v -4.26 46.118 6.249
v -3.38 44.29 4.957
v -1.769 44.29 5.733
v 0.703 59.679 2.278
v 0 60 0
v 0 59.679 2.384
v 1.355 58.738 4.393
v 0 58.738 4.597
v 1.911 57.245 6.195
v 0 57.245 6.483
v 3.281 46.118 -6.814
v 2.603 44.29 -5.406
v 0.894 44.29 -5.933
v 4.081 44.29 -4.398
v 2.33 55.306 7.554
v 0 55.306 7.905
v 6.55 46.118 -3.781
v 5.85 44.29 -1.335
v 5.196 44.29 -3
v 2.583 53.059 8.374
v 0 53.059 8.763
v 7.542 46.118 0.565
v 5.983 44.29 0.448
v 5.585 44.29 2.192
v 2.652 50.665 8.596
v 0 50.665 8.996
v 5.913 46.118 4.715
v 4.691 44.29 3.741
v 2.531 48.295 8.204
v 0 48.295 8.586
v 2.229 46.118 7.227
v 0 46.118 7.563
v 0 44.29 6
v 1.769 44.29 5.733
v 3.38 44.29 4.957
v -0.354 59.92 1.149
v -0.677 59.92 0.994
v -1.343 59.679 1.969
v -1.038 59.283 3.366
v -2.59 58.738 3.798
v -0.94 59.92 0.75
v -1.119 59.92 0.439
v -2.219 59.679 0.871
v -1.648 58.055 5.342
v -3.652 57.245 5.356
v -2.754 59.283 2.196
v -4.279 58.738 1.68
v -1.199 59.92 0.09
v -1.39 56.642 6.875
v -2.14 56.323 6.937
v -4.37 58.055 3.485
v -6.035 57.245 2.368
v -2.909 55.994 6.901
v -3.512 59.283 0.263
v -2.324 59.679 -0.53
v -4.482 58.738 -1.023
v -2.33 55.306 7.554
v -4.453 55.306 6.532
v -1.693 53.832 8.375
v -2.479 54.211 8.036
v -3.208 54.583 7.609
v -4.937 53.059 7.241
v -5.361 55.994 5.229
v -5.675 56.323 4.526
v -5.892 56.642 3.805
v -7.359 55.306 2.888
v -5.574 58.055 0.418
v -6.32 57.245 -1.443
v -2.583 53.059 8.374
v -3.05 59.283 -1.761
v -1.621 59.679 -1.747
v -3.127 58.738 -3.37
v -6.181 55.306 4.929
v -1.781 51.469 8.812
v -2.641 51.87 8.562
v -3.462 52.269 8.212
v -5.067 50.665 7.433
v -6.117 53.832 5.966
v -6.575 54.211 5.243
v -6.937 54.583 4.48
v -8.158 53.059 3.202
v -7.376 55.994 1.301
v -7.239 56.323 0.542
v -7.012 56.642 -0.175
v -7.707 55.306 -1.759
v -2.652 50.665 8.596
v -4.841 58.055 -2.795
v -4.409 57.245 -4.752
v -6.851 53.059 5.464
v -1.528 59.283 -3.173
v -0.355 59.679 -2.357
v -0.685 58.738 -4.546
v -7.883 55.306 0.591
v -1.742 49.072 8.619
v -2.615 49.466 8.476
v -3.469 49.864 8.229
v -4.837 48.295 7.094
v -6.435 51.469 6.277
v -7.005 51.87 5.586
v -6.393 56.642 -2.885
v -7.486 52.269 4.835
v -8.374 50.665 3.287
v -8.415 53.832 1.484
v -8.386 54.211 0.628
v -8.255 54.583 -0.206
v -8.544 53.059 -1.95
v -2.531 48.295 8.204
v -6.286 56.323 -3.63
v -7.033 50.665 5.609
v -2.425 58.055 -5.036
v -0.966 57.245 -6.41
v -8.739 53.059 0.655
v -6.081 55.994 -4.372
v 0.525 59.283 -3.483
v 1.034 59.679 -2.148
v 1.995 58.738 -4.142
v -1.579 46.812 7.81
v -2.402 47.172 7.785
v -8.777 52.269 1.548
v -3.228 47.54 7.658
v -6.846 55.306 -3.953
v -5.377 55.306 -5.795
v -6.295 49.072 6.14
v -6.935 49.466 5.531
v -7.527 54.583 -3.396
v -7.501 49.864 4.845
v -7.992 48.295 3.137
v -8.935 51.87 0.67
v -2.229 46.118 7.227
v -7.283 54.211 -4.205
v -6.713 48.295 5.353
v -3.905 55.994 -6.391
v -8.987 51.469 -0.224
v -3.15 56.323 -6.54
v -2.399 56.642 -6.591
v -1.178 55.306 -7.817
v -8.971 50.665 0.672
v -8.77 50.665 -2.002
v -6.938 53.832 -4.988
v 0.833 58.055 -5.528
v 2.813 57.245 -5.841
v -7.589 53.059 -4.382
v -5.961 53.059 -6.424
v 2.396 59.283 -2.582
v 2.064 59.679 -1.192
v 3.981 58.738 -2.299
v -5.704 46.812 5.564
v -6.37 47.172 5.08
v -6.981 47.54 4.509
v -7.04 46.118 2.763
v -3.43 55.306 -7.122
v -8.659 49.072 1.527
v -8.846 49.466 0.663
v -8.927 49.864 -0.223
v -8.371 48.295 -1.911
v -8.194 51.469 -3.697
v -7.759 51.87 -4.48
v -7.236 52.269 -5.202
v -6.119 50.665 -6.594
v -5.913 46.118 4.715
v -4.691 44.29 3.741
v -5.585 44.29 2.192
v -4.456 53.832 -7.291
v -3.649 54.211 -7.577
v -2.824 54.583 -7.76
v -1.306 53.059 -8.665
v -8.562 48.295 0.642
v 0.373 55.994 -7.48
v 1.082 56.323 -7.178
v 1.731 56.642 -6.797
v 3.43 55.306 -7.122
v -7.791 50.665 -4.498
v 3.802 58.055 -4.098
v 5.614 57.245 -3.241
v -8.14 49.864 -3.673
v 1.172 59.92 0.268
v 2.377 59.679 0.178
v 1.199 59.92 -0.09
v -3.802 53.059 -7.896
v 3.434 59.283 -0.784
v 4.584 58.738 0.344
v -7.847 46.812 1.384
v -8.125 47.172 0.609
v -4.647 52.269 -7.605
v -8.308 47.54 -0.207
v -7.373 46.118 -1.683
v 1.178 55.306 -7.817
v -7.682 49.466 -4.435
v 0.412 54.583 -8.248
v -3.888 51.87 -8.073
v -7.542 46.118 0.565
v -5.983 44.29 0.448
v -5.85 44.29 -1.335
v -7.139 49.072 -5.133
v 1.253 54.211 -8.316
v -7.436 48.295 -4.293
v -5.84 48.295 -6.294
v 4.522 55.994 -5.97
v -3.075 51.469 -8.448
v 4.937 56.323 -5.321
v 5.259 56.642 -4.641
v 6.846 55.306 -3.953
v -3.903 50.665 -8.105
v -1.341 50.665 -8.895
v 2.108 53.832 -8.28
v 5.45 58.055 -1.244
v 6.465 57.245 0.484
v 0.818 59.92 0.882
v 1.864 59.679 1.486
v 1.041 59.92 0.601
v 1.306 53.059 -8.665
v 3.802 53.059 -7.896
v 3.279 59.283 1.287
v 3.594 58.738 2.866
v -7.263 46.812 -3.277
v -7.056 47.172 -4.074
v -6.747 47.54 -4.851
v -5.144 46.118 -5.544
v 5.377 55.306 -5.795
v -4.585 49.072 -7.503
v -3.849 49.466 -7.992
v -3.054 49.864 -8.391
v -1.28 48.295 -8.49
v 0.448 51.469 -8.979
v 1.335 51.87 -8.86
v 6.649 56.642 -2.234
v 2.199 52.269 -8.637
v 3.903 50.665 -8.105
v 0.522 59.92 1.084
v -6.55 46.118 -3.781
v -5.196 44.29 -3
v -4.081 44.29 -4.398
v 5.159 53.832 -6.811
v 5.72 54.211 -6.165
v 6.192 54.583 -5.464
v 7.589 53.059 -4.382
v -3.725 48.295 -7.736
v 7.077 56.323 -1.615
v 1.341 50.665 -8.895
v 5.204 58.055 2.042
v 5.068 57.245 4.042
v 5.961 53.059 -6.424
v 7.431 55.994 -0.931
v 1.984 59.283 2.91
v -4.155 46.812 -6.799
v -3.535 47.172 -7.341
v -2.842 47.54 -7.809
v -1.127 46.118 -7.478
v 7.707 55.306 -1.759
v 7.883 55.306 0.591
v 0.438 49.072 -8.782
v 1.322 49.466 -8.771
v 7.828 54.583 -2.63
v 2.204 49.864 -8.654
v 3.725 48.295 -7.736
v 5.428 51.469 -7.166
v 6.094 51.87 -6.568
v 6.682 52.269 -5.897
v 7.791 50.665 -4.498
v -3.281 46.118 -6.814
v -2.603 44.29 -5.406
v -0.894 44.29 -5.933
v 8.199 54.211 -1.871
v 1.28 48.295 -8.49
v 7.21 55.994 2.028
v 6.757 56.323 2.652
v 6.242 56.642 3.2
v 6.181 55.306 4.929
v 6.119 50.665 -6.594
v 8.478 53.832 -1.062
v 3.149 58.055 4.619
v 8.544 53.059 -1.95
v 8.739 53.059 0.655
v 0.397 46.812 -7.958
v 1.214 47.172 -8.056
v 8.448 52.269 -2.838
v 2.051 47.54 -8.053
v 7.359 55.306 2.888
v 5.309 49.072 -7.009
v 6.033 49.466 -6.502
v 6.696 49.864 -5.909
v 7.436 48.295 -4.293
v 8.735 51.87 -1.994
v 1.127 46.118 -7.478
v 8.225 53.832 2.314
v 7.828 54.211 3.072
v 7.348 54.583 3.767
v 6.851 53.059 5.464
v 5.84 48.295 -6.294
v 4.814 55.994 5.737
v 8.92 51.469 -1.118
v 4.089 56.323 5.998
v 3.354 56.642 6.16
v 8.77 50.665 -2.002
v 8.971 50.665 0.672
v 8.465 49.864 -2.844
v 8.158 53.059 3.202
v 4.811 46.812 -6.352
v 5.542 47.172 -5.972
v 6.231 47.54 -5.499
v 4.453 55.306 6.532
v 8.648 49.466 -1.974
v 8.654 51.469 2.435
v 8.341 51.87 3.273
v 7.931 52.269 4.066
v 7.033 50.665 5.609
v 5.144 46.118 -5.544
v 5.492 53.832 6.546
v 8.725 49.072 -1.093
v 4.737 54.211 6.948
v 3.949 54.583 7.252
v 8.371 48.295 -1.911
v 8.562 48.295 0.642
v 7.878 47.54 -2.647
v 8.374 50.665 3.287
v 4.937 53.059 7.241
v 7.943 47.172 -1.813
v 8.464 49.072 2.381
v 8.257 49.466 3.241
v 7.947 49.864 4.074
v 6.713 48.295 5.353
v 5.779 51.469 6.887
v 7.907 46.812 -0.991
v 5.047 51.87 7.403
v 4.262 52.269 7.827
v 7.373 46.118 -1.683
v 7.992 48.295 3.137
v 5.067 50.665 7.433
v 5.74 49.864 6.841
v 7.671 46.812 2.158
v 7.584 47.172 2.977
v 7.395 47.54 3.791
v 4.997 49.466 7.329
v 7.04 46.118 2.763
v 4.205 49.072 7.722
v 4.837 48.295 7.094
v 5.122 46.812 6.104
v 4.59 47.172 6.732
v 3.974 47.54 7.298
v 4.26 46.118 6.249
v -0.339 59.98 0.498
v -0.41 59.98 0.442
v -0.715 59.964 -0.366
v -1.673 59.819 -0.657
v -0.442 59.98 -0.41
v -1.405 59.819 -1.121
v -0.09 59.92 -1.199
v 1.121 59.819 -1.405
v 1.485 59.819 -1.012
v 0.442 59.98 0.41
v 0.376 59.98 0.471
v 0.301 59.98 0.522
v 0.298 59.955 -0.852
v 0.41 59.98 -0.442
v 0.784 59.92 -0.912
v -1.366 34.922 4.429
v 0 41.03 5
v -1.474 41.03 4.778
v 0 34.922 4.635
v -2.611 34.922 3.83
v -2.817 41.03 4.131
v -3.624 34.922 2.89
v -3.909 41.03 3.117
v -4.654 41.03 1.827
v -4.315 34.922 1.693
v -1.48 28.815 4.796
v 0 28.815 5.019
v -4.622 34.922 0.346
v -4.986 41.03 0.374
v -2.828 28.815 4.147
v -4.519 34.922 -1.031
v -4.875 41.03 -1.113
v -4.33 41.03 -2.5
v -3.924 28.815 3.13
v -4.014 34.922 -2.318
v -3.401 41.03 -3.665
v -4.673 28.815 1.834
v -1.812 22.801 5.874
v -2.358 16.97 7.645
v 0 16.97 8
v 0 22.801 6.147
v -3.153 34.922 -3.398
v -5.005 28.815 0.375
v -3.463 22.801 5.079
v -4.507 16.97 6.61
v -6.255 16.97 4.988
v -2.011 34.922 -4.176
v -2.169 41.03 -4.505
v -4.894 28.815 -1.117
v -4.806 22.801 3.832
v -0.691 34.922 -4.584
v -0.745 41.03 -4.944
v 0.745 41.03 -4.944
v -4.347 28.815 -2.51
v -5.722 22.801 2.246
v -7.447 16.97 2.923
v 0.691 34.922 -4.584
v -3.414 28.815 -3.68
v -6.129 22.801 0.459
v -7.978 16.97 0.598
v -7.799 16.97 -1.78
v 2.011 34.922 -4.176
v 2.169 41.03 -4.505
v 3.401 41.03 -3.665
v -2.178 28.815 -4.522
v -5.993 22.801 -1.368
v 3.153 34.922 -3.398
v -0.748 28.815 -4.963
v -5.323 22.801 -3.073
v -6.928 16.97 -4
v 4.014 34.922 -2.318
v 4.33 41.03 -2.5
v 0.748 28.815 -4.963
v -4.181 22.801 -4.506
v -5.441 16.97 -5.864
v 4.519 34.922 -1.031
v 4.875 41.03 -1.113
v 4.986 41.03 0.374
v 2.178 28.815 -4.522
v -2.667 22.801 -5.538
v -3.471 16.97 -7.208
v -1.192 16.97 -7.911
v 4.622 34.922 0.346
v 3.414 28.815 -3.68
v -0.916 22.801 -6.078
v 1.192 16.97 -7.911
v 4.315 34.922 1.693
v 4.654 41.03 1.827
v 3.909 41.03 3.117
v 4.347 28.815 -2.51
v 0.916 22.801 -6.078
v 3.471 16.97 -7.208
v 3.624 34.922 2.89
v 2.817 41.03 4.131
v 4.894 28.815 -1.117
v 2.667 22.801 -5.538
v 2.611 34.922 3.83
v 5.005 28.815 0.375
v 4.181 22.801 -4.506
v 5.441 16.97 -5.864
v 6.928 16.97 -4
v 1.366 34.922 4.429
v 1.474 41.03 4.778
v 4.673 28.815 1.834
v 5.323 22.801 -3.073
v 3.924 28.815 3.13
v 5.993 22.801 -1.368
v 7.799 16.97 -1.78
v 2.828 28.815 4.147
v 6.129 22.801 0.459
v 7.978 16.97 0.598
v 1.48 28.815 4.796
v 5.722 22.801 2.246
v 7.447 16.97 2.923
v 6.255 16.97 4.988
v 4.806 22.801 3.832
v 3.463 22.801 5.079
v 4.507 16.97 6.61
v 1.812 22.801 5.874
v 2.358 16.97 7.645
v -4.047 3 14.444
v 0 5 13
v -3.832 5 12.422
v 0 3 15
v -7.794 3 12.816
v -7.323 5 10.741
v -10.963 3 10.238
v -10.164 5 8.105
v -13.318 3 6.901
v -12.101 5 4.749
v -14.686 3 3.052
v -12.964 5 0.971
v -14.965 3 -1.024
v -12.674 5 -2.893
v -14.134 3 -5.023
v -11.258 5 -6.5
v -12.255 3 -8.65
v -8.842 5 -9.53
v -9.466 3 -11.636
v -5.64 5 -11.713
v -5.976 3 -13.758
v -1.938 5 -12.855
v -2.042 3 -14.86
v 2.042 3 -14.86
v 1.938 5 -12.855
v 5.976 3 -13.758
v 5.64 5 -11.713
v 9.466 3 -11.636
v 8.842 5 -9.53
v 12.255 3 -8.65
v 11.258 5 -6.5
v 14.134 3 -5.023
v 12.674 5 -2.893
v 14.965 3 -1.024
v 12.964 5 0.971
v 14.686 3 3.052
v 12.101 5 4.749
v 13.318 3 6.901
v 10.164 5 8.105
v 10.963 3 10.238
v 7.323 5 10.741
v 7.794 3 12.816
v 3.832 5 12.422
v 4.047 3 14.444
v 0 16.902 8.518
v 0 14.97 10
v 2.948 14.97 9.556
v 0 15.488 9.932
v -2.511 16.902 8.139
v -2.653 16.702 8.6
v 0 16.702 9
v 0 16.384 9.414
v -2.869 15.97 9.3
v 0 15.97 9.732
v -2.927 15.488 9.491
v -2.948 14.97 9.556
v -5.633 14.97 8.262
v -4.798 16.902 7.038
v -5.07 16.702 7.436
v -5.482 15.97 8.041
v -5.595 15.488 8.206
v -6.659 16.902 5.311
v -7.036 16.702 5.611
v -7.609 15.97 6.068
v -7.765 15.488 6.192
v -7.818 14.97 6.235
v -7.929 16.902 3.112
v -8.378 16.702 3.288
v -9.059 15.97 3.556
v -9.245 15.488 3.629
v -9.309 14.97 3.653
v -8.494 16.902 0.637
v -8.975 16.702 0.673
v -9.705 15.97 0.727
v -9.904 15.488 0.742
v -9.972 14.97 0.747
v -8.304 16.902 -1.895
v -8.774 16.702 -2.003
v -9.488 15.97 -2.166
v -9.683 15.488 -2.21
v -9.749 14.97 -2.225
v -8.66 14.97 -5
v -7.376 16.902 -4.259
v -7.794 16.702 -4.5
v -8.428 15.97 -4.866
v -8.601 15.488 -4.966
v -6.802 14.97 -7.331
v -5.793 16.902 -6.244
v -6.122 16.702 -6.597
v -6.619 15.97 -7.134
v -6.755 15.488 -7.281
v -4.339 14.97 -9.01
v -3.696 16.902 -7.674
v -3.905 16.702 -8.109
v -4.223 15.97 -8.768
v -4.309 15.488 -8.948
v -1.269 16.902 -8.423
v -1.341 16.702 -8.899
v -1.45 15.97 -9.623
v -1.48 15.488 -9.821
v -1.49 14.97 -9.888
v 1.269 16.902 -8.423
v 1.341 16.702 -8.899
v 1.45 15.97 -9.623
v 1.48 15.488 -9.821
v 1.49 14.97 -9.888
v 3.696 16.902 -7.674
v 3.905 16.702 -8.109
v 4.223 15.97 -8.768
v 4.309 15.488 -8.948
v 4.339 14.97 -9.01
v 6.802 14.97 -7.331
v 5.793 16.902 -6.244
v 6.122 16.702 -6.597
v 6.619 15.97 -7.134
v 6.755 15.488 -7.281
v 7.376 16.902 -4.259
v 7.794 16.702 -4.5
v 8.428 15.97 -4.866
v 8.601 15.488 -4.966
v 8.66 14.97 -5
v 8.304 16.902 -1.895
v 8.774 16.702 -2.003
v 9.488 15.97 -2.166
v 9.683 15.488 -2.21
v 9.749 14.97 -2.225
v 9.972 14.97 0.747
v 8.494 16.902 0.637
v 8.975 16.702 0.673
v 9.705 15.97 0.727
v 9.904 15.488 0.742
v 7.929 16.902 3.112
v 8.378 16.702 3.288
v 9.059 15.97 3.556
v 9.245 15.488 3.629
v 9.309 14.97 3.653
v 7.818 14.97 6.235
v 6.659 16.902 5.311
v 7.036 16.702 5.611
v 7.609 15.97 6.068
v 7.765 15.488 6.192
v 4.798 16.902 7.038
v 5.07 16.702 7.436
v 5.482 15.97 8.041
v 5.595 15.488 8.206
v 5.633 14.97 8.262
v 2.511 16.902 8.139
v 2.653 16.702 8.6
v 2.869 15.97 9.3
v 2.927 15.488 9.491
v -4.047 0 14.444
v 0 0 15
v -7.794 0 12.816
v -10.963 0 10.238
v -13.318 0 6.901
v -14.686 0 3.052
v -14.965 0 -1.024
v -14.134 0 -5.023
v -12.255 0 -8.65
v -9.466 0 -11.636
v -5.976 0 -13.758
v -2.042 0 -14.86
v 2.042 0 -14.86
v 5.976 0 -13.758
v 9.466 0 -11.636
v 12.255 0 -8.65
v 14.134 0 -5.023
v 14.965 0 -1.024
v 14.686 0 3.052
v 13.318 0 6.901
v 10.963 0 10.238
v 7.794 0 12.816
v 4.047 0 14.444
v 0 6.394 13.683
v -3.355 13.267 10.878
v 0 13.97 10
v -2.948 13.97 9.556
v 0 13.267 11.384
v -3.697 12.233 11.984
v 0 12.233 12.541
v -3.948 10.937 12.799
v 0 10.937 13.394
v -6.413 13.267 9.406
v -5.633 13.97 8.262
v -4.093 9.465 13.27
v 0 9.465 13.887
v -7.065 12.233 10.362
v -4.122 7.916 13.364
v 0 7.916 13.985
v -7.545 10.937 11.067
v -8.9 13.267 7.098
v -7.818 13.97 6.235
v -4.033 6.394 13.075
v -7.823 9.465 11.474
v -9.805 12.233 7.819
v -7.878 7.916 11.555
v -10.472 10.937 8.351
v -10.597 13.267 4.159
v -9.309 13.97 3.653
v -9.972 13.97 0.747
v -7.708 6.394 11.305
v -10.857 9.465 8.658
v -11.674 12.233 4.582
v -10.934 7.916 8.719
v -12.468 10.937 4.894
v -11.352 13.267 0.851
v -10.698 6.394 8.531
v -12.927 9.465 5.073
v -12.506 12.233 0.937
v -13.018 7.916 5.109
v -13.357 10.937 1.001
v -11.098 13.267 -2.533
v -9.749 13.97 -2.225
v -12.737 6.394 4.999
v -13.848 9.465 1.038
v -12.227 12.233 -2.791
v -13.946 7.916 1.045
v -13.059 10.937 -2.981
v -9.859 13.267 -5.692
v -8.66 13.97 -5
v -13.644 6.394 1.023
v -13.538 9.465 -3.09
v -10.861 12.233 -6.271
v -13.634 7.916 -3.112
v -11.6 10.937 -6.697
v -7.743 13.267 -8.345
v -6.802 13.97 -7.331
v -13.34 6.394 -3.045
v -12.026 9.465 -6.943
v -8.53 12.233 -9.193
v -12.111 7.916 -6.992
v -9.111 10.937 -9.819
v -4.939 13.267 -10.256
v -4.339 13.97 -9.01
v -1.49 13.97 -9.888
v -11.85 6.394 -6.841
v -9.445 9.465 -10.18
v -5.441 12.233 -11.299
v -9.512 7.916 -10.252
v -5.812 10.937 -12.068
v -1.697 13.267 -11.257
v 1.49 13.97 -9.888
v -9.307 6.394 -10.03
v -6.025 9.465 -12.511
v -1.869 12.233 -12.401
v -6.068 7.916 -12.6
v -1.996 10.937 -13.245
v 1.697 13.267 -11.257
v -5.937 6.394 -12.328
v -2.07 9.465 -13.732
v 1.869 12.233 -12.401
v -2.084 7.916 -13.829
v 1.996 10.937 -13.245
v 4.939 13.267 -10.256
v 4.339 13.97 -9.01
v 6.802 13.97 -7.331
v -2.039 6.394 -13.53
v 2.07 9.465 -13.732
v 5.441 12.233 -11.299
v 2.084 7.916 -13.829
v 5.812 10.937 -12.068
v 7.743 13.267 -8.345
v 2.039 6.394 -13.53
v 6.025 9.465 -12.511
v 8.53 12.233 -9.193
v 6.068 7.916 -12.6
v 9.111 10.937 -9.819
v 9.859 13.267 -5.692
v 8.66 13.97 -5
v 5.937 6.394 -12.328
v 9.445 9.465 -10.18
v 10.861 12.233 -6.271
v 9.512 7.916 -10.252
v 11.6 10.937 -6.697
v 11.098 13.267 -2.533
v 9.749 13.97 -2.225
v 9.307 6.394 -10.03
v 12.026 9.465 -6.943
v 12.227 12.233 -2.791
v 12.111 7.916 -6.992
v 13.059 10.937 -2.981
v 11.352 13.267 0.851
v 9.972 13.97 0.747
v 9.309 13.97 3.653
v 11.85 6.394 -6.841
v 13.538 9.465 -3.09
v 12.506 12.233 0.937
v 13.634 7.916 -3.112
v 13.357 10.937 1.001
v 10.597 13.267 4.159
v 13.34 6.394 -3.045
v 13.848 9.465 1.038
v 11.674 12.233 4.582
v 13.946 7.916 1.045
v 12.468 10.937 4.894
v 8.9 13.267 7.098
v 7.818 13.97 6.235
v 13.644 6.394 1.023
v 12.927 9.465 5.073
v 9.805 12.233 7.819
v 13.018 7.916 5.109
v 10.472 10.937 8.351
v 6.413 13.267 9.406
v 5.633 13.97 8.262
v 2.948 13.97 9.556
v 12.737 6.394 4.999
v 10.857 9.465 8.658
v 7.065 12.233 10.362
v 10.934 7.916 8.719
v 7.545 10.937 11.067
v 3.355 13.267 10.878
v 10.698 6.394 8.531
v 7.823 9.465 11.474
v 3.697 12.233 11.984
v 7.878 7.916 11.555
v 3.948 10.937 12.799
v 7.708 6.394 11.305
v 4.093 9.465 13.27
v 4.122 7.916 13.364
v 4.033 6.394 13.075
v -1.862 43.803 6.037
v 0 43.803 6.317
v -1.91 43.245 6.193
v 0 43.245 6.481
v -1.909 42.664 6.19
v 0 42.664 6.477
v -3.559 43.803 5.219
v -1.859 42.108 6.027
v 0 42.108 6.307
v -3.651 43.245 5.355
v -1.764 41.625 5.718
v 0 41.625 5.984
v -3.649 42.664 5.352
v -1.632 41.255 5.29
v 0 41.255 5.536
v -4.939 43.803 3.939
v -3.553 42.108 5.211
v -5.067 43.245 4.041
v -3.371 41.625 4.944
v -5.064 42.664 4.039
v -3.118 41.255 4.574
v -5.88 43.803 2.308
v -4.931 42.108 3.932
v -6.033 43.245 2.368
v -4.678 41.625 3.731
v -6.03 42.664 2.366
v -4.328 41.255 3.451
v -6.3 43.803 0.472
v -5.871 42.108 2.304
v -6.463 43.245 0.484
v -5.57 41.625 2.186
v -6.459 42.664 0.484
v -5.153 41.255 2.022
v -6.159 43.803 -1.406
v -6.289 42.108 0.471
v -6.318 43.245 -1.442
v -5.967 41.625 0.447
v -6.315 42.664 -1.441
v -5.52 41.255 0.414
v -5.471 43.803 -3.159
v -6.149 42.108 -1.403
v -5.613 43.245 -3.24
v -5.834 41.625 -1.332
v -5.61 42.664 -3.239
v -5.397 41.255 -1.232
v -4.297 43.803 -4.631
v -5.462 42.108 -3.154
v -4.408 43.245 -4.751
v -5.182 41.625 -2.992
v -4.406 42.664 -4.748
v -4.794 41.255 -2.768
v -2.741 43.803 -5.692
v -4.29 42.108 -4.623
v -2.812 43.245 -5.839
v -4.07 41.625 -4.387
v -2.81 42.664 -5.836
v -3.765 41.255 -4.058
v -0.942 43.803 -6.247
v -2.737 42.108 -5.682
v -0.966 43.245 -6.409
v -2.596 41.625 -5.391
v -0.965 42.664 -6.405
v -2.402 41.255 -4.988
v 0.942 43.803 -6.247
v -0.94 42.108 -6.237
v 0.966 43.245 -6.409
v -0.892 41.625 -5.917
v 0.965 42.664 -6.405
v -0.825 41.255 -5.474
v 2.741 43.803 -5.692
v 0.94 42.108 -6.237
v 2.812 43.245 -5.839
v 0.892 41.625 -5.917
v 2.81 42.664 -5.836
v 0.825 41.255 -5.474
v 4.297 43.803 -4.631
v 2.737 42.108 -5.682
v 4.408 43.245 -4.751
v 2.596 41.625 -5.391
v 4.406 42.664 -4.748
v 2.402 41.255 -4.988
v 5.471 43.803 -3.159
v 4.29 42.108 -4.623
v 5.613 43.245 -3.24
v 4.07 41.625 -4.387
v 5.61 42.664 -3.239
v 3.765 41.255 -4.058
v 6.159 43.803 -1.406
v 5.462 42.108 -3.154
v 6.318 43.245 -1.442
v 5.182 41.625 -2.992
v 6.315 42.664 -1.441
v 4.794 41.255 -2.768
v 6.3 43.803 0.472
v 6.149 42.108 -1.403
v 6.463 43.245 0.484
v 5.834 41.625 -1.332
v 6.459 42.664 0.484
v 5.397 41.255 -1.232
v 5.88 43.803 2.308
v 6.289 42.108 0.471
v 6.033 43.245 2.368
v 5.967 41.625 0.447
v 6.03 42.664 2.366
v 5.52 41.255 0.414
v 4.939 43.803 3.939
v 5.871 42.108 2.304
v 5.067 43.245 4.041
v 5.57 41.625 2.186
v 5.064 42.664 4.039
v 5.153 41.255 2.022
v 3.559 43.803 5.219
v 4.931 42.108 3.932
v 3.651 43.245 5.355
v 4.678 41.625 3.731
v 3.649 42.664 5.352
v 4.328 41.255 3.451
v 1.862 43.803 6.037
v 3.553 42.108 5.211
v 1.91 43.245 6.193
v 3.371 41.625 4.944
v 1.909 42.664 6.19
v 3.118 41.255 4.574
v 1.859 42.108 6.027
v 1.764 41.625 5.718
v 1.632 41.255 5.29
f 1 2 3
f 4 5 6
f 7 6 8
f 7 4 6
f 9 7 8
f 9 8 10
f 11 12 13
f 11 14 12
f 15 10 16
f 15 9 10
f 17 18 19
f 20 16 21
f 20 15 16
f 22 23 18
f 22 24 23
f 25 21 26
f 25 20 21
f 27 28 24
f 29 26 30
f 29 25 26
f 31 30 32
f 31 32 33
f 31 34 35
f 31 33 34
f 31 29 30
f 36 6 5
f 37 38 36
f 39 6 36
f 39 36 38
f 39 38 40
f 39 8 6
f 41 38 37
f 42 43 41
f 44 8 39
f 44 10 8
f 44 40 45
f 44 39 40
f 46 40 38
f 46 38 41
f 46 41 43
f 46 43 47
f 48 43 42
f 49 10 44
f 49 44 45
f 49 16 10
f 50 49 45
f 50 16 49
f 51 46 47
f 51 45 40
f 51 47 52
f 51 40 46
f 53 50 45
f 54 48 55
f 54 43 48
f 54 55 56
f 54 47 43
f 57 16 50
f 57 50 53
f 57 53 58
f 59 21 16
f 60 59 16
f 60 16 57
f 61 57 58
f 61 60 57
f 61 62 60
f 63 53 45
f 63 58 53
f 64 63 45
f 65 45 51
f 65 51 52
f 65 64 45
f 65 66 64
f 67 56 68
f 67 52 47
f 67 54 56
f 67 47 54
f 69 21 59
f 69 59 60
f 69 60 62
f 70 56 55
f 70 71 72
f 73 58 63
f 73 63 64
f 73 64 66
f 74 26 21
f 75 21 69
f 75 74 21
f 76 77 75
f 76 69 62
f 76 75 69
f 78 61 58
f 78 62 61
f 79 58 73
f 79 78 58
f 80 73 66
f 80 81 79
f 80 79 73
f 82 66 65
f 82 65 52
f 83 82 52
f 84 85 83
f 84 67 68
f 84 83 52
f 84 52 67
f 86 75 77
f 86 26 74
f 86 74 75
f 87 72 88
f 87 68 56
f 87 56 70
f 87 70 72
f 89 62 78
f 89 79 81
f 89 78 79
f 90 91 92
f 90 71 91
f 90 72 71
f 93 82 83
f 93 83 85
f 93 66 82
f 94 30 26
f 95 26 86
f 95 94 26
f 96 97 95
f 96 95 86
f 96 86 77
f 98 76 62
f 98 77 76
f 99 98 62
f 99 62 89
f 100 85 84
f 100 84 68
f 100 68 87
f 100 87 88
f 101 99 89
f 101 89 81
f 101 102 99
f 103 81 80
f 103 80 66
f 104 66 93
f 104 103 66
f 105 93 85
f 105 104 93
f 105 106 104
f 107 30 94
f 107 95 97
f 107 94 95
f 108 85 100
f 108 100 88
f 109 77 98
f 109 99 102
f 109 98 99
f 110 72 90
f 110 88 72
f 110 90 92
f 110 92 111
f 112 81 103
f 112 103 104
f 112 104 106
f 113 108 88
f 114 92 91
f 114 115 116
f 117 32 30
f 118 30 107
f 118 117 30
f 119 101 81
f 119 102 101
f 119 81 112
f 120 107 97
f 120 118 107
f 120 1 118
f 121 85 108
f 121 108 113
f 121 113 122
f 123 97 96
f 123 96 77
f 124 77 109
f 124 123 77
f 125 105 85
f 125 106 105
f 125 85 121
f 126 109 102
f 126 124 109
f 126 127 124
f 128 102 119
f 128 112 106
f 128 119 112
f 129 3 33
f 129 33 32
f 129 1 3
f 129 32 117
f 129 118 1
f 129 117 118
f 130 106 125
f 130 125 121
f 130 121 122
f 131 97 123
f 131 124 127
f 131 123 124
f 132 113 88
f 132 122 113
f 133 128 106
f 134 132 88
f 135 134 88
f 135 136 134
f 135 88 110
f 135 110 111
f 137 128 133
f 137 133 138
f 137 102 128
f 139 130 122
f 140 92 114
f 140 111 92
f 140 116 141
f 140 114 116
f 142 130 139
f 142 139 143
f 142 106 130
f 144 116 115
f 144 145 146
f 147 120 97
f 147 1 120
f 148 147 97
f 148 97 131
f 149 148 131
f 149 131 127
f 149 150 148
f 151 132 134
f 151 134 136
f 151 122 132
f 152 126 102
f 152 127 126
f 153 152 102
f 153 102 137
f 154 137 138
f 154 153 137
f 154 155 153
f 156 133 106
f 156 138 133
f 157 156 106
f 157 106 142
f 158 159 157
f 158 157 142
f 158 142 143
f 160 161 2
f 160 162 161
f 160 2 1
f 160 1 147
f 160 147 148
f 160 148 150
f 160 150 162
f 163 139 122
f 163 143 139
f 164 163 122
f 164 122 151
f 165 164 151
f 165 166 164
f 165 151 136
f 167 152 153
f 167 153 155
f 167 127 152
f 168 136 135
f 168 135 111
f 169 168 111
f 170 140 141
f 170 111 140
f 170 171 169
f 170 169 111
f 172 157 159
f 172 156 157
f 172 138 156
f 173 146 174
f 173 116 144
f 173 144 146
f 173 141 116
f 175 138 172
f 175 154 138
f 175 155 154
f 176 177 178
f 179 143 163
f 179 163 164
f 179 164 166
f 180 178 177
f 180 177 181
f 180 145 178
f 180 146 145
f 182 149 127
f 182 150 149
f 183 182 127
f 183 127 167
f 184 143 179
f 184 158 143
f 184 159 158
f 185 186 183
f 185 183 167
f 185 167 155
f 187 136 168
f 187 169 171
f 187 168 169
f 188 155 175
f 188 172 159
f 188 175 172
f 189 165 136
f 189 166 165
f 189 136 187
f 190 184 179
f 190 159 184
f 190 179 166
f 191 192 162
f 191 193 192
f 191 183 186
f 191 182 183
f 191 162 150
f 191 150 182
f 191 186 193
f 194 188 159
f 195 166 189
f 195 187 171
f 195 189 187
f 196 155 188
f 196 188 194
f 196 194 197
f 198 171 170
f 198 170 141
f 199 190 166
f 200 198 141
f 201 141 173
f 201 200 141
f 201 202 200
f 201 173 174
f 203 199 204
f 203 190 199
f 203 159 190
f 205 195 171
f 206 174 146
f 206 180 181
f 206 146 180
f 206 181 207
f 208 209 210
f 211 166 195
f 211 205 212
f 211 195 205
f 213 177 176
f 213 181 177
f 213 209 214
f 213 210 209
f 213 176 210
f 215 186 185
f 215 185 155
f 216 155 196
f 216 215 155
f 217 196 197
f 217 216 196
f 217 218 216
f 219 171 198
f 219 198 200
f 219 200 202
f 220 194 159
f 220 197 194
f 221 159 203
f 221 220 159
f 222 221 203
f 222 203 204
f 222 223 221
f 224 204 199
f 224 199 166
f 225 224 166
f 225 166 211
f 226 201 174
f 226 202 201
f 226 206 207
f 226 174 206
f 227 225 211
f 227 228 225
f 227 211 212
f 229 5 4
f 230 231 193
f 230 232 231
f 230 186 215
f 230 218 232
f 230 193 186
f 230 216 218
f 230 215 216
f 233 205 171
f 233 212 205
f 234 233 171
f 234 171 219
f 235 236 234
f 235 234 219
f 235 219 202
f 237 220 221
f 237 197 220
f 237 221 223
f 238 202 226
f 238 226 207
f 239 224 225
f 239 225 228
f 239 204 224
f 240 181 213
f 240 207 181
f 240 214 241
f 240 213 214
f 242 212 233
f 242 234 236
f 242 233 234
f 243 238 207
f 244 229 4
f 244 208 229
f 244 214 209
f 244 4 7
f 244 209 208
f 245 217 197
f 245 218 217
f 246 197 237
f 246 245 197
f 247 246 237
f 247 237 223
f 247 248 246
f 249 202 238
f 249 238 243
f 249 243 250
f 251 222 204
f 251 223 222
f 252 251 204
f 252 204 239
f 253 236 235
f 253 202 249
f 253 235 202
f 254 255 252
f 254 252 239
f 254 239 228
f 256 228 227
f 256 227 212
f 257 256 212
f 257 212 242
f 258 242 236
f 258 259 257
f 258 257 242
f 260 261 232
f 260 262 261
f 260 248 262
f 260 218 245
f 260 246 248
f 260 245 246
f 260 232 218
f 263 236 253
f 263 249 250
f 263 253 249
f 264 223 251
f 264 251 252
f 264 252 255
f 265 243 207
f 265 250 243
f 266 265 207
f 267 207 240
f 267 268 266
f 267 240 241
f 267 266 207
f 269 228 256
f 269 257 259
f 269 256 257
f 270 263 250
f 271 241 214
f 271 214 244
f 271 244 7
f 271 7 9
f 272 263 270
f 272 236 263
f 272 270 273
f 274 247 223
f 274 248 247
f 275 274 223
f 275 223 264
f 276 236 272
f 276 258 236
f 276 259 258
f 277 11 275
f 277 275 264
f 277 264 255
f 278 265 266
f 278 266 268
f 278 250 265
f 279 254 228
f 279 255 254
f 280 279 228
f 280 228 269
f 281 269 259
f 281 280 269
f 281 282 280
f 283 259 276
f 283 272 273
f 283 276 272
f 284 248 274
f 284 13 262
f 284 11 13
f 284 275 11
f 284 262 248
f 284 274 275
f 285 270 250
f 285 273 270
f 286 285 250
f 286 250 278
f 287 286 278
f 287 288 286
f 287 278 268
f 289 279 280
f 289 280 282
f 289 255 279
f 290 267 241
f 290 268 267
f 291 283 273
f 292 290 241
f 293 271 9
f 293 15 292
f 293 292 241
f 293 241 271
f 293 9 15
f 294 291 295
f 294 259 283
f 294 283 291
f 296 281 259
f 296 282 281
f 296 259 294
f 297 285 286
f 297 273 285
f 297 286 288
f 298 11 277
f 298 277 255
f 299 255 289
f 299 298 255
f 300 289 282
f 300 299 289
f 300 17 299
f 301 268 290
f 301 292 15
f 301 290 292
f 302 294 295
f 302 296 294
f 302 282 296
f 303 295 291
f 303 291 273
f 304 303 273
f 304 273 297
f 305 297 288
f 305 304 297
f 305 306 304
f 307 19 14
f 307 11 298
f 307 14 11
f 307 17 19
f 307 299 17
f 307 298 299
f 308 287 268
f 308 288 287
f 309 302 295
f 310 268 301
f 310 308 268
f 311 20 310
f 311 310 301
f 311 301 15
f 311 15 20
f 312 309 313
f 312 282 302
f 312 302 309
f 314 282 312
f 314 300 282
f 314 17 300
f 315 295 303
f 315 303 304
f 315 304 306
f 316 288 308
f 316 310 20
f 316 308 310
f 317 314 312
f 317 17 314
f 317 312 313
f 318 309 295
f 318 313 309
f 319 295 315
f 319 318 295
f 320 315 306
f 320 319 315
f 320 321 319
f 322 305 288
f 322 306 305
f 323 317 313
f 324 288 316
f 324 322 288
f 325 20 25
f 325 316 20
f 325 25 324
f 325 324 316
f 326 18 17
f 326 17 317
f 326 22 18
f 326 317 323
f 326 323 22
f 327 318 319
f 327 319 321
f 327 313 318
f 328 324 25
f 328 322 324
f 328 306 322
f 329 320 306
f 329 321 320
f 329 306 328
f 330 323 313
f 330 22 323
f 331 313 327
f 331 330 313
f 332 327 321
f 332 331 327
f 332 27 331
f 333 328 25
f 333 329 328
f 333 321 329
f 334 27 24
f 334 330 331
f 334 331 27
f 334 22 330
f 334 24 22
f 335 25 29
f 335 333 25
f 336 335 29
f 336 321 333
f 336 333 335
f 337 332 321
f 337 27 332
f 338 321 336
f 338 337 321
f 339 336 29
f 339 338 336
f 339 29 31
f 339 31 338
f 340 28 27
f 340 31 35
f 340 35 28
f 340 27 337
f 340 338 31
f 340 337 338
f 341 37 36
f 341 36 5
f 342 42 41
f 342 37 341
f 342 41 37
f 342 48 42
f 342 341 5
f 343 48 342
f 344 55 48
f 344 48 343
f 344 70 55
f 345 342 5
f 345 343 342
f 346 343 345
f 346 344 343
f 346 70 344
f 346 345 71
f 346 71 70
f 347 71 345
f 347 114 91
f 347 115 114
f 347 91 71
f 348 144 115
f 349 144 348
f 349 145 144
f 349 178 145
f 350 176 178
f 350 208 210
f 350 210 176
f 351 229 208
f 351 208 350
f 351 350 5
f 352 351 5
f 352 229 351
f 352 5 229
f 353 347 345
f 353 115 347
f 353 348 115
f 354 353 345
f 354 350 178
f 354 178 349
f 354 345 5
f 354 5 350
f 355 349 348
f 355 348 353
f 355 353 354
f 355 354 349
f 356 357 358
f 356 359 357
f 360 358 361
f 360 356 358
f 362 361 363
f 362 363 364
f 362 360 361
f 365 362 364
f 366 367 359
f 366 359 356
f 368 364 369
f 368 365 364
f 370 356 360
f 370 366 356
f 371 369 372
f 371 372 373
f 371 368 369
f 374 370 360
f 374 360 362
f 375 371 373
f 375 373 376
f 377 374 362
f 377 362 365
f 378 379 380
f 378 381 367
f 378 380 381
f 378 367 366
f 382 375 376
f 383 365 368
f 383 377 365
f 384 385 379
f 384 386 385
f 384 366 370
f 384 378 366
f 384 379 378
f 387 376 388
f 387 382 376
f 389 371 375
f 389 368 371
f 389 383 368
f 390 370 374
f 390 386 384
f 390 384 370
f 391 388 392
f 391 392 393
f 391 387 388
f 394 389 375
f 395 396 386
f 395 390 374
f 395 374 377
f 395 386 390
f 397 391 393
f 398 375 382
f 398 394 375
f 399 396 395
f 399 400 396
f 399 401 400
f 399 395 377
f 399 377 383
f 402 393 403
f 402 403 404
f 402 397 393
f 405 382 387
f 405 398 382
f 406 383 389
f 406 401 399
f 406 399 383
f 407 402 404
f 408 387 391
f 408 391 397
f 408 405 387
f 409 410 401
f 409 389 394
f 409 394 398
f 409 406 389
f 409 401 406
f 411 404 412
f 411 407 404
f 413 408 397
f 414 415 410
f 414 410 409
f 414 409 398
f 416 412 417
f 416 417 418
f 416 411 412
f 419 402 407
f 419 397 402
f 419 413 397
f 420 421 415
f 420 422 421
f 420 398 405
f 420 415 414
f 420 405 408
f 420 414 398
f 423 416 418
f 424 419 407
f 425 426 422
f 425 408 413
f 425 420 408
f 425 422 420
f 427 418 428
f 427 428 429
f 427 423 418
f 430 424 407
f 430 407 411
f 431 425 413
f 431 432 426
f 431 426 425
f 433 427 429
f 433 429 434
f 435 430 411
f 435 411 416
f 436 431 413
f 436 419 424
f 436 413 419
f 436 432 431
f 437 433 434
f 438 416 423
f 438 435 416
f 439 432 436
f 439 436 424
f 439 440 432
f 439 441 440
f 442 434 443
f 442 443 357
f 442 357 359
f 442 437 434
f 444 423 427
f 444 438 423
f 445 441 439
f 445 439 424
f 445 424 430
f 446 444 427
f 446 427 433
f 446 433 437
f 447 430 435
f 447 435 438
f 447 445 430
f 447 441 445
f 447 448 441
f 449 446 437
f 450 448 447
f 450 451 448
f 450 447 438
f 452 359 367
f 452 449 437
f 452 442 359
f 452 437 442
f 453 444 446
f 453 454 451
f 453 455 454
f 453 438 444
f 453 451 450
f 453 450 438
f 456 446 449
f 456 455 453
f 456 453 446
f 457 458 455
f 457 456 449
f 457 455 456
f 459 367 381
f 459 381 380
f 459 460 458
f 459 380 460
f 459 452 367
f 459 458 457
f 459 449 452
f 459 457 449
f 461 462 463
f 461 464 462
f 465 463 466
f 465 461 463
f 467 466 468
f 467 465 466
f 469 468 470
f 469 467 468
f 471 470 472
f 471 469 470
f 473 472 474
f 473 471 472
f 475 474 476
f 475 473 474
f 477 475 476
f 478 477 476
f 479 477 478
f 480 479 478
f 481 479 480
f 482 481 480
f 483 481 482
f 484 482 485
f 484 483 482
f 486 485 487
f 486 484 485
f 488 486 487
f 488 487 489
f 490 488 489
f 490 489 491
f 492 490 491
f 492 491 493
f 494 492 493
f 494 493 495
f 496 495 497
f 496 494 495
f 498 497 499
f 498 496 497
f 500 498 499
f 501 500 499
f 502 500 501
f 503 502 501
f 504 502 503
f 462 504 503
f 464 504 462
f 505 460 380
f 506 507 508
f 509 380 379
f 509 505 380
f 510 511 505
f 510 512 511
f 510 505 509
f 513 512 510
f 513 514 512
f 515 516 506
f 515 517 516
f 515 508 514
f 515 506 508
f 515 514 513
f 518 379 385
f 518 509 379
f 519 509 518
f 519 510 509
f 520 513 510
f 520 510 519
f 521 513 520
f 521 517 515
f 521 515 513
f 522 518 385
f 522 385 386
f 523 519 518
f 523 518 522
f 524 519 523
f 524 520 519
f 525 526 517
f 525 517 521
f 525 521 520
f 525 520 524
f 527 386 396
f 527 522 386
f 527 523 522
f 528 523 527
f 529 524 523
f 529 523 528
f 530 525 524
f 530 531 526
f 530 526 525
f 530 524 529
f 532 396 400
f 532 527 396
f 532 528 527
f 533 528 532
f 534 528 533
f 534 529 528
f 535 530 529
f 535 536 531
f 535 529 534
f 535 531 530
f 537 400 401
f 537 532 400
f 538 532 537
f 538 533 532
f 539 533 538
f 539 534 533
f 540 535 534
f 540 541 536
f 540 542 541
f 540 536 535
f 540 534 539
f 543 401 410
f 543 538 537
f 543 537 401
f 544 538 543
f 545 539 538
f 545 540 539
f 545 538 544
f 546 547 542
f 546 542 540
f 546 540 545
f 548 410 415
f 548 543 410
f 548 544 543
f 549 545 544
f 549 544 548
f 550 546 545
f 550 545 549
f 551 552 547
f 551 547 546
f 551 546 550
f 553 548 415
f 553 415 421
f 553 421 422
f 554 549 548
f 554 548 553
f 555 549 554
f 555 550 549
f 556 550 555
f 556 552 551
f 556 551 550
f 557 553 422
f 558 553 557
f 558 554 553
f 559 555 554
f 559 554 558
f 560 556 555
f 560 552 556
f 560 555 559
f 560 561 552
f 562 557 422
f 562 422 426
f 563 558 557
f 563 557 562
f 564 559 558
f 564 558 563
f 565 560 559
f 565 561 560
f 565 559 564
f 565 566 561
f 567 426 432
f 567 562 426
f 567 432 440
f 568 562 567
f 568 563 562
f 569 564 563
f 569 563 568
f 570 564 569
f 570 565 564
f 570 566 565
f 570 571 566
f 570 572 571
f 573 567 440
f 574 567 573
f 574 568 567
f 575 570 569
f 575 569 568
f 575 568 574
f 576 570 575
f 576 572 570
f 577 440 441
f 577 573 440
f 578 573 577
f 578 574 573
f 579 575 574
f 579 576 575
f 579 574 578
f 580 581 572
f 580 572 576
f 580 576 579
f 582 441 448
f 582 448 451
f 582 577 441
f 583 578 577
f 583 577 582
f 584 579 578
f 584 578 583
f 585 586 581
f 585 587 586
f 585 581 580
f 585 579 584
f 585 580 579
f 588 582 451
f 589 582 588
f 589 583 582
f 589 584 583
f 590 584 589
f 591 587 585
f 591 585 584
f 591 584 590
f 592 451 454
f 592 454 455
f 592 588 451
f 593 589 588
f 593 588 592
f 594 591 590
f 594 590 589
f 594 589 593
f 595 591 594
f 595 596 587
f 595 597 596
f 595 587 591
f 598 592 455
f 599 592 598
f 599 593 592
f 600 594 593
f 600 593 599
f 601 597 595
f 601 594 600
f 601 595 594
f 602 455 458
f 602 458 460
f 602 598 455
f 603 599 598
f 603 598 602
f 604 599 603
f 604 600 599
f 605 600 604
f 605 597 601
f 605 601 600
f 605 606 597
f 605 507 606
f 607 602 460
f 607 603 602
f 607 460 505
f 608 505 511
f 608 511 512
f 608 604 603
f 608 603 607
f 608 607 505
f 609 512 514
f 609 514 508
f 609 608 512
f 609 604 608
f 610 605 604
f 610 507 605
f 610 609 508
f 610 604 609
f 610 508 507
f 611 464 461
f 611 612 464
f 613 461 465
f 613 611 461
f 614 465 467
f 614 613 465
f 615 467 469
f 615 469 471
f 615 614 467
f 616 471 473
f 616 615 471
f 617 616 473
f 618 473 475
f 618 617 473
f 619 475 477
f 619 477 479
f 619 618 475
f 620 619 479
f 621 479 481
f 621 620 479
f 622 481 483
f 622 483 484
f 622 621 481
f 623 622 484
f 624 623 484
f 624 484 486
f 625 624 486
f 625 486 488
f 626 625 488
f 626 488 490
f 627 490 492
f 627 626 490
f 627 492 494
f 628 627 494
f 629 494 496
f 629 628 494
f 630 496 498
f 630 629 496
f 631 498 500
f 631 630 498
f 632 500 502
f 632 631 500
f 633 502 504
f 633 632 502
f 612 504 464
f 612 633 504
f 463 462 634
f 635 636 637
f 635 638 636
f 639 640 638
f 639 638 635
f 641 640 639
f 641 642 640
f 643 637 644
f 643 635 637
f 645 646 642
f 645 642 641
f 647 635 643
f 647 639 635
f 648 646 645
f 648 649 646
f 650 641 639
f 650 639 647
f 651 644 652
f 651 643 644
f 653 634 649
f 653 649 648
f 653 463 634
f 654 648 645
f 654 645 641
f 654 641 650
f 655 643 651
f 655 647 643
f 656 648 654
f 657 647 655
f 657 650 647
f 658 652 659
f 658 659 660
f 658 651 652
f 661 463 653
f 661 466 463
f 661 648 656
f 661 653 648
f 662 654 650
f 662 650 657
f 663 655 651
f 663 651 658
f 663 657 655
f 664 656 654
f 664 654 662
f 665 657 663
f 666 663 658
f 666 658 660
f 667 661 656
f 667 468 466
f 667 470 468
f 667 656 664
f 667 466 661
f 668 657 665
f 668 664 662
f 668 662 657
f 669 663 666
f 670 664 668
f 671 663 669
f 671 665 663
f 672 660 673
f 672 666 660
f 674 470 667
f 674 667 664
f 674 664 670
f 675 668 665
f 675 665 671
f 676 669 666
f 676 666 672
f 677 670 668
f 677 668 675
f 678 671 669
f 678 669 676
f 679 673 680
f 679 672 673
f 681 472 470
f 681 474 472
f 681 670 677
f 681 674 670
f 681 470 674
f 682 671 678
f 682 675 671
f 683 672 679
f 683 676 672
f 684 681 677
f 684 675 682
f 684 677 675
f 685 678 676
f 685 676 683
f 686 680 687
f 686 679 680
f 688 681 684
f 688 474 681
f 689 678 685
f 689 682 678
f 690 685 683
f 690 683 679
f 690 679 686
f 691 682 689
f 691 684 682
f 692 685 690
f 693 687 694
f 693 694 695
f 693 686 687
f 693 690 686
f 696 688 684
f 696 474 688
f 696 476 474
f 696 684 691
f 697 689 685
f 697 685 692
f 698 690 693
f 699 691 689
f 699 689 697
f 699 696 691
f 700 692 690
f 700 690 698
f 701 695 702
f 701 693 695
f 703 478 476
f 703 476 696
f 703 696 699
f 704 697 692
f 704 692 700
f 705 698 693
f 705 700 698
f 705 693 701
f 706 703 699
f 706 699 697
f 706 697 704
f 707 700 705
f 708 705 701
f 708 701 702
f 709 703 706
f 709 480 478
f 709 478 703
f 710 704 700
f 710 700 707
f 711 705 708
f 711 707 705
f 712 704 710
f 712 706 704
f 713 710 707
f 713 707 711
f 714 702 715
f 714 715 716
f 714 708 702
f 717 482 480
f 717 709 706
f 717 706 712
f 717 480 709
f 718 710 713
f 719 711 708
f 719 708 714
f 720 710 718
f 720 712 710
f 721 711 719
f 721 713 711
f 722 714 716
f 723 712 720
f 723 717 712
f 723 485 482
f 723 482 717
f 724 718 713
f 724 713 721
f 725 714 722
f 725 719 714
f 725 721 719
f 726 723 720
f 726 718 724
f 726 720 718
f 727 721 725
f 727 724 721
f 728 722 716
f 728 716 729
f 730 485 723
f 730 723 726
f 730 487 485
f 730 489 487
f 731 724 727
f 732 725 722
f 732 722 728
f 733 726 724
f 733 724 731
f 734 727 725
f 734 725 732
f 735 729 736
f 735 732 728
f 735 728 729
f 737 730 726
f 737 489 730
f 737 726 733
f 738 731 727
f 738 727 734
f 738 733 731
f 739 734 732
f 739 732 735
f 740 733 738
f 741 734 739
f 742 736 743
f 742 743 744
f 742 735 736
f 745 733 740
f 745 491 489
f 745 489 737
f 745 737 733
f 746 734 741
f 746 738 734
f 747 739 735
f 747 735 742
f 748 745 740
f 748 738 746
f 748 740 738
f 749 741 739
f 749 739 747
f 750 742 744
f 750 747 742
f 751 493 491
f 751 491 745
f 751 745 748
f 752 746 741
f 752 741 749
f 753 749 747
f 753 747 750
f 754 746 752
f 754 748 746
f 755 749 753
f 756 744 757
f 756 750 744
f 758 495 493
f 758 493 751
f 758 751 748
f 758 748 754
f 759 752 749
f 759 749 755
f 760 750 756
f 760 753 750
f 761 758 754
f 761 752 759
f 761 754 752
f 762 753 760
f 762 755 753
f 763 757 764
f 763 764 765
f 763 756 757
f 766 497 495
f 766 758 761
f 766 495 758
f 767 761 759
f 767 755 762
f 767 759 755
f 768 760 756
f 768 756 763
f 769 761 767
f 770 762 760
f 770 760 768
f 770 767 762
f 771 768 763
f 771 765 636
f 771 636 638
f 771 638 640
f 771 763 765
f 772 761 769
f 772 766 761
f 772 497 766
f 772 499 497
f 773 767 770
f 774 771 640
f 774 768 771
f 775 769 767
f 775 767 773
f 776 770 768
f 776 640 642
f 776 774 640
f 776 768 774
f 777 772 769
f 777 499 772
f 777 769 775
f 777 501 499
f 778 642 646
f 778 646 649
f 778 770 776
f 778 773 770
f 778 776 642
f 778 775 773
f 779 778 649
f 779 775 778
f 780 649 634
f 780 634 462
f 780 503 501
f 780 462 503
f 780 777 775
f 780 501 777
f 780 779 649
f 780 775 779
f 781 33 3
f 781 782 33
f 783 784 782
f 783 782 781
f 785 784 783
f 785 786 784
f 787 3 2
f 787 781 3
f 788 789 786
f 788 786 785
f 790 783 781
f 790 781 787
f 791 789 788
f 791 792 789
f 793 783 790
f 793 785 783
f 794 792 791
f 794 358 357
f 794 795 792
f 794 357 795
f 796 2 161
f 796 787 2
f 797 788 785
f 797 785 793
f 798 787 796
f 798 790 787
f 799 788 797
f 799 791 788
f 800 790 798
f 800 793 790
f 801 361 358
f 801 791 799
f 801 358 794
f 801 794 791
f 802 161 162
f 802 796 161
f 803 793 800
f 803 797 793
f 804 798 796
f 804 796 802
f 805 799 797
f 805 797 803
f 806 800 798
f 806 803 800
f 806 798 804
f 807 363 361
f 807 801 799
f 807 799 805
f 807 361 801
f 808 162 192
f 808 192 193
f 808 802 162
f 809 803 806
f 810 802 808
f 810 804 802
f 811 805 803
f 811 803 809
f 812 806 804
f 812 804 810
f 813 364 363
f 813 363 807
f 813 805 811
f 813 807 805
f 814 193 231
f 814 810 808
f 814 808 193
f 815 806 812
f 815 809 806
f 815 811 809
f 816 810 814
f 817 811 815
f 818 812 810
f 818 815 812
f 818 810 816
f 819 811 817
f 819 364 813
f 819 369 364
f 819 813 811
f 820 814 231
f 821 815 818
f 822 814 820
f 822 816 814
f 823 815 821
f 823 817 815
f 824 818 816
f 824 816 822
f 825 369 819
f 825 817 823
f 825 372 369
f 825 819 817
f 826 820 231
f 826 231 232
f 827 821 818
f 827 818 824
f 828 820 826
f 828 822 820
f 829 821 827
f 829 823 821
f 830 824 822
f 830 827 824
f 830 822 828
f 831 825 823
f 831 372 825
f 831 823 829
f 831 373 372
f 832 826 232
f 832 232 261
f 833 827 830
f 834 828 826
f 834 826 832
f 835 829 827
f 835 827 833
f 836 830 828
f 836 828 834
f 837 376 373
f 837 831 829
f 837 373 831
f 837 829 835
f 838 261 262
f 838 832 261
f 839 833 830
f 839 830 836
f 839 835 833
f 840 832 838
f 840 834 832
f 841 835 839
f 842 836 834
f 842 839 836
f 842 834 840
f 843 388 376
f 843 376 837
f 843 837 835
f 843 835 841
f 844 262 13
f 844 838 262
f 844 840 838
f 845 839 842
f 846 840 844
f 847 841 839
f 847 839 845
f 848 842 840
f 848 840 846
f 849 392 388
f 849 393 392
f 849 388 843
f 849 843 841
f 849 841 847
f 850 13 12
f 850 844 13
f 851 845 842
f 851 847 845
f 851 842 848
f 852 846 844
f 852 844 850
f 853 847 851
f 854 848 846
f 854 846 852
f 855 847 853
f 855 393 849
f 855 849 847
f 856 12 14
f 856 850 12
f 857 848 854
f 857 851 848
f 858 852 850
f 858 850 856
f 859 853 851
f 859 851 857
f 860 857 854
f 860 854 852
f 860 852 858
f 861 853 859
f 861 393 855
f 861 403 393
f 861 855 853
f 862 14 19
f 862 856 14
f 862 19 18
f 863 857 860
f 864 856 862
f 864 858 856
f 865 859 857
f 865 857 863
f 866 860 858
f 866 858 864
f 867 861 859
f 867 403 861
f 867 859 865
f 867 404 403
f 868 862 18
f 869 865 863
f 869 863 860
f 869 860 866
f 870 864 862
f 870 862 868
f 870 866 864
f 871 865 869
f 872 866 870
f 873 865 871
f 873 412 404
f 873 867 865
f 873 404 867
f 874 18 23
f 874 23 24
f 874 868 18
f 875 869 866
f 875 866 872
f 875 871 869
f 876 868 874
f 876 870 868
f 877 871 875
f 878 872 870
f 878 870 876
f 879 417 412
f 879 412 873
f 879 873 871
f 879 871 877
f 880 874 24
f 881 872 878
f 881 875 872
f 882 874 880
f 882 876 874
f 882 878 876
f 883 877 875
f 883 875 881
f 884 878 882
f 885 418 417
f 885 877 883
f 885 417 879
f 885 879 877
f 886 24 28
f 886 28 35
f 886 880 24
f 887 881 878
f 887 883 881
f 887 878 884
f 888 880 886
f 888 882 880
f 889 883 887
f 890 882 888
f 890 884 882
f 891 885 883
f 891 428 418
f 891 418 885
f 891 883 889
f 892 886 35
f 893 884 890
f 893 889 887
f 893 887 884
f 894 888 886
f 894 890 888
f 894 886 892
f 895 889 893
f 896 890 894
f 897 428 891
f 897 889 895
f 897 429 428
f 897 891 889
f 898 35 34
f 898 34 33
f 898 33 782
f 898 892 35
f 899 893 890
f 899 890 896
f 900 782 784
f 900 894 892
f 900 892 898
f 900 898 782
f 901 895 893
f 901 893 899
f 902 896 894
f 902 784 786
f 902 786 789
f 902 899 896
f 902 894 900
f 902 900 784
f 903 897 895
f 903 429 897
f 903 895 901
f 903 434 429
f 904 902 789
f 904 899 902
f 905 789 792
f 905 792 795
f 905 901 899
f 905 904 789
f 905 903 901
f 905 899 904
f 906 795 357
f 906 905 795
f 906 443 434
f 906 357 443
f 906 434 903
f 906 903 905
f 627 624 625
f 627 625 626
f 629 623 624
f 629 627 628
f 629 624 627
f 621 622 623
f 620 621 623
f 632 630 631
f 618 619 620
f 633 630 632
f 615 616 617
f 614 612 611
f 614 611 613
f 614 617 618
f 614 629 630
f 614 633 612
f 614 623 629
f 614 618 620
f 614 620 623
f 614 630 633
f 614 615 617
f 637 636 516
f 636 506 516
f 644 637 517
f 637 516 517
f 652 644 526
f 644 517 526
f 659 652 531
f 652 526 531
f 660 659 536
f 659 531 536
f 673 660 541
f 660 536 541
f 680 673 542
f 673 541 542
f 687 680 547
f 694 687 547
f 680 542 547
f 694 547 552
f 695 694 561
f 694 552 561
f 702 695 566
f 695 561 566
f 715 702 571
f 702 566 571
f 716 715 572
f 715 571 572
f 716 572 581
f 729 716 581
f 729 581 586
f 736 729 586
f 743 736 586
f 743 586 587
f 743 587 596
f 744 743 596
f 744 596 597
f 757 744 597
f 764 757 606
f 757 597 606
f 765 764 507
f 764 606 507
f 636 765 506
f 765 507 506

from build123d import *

# Parameters (mm, degrees)
SKETCH1_W = 10
SKETCH1_H = 1


with BuildPart() as part:
    # Sketch1 → Revolve1 (revolve)
    with BuildSketch(Plane.XY, mode=Mode.PRIVATE) as revolve1_sk:
        with BuildLine():
            Line((0, 44.29), (0, 60))
            ThreePointArc((0, 60), (-8.409682529, 54.211078624), (-6, 44.29))
            Line((-6, 44.29), (0, 44.29))
        make_face()
        with BuildLine():
            Line((0, 41.03), (0, 44.29))
            Line((0, 44.29), (-6, 44.29))
            ThreePointArc((-6, 44.29), (-6.412519214, 42.380086131), (-5, 41.03))
            Line((-5, 41.03), (0, 41.03))
        make_face()
        with BuildLine():
            Line((0, 16.97), (0, 41.03))
            Line((0, 41.03), (-5, 41.03))
            ThreePointArc((-5, 41.03), (-5.019495729, 28.81539847), (-8, 16.97))
            Line((-8, 16.97), (0, 16.97))
        make_face()
        with BuildLine():
            Line((0, 14.97), (0, 16.97))
            Line((0, 16.97), (-8, 16.97))
            ThreePointArc((-8, 16.97), (-9.414213562, 16.384213562), (-10, 14.97))
            Line((-10, 14.97), (0, 14.97))
        make_face()
        with Locations((-5, 14.47)):
            Rectangle(SKETCH1_W, SKETCH1_H)
        with BuildLine():
            Line((0, 5), (0, 13.97))
            Line((0, 13.97), (-10, 13.97))
            ThreePointArc((-10, 13.97), (-13.688325627, 10.216881481), (-13, 5))
            Line((-13, 5), (0, 5))
        make_face()
        Polygon((0, 0), (0, 5), (-13, 5), (-15, 3), (-15, 0), align=None)
    revolve(revolve1_sk.sketch.rotate(Axis((0, 69.118100181, 0), (0, -1, 0)), 270), axis=Axis((0, 69.118100181, 0), (0, -1, 0)))


solid = part.part
